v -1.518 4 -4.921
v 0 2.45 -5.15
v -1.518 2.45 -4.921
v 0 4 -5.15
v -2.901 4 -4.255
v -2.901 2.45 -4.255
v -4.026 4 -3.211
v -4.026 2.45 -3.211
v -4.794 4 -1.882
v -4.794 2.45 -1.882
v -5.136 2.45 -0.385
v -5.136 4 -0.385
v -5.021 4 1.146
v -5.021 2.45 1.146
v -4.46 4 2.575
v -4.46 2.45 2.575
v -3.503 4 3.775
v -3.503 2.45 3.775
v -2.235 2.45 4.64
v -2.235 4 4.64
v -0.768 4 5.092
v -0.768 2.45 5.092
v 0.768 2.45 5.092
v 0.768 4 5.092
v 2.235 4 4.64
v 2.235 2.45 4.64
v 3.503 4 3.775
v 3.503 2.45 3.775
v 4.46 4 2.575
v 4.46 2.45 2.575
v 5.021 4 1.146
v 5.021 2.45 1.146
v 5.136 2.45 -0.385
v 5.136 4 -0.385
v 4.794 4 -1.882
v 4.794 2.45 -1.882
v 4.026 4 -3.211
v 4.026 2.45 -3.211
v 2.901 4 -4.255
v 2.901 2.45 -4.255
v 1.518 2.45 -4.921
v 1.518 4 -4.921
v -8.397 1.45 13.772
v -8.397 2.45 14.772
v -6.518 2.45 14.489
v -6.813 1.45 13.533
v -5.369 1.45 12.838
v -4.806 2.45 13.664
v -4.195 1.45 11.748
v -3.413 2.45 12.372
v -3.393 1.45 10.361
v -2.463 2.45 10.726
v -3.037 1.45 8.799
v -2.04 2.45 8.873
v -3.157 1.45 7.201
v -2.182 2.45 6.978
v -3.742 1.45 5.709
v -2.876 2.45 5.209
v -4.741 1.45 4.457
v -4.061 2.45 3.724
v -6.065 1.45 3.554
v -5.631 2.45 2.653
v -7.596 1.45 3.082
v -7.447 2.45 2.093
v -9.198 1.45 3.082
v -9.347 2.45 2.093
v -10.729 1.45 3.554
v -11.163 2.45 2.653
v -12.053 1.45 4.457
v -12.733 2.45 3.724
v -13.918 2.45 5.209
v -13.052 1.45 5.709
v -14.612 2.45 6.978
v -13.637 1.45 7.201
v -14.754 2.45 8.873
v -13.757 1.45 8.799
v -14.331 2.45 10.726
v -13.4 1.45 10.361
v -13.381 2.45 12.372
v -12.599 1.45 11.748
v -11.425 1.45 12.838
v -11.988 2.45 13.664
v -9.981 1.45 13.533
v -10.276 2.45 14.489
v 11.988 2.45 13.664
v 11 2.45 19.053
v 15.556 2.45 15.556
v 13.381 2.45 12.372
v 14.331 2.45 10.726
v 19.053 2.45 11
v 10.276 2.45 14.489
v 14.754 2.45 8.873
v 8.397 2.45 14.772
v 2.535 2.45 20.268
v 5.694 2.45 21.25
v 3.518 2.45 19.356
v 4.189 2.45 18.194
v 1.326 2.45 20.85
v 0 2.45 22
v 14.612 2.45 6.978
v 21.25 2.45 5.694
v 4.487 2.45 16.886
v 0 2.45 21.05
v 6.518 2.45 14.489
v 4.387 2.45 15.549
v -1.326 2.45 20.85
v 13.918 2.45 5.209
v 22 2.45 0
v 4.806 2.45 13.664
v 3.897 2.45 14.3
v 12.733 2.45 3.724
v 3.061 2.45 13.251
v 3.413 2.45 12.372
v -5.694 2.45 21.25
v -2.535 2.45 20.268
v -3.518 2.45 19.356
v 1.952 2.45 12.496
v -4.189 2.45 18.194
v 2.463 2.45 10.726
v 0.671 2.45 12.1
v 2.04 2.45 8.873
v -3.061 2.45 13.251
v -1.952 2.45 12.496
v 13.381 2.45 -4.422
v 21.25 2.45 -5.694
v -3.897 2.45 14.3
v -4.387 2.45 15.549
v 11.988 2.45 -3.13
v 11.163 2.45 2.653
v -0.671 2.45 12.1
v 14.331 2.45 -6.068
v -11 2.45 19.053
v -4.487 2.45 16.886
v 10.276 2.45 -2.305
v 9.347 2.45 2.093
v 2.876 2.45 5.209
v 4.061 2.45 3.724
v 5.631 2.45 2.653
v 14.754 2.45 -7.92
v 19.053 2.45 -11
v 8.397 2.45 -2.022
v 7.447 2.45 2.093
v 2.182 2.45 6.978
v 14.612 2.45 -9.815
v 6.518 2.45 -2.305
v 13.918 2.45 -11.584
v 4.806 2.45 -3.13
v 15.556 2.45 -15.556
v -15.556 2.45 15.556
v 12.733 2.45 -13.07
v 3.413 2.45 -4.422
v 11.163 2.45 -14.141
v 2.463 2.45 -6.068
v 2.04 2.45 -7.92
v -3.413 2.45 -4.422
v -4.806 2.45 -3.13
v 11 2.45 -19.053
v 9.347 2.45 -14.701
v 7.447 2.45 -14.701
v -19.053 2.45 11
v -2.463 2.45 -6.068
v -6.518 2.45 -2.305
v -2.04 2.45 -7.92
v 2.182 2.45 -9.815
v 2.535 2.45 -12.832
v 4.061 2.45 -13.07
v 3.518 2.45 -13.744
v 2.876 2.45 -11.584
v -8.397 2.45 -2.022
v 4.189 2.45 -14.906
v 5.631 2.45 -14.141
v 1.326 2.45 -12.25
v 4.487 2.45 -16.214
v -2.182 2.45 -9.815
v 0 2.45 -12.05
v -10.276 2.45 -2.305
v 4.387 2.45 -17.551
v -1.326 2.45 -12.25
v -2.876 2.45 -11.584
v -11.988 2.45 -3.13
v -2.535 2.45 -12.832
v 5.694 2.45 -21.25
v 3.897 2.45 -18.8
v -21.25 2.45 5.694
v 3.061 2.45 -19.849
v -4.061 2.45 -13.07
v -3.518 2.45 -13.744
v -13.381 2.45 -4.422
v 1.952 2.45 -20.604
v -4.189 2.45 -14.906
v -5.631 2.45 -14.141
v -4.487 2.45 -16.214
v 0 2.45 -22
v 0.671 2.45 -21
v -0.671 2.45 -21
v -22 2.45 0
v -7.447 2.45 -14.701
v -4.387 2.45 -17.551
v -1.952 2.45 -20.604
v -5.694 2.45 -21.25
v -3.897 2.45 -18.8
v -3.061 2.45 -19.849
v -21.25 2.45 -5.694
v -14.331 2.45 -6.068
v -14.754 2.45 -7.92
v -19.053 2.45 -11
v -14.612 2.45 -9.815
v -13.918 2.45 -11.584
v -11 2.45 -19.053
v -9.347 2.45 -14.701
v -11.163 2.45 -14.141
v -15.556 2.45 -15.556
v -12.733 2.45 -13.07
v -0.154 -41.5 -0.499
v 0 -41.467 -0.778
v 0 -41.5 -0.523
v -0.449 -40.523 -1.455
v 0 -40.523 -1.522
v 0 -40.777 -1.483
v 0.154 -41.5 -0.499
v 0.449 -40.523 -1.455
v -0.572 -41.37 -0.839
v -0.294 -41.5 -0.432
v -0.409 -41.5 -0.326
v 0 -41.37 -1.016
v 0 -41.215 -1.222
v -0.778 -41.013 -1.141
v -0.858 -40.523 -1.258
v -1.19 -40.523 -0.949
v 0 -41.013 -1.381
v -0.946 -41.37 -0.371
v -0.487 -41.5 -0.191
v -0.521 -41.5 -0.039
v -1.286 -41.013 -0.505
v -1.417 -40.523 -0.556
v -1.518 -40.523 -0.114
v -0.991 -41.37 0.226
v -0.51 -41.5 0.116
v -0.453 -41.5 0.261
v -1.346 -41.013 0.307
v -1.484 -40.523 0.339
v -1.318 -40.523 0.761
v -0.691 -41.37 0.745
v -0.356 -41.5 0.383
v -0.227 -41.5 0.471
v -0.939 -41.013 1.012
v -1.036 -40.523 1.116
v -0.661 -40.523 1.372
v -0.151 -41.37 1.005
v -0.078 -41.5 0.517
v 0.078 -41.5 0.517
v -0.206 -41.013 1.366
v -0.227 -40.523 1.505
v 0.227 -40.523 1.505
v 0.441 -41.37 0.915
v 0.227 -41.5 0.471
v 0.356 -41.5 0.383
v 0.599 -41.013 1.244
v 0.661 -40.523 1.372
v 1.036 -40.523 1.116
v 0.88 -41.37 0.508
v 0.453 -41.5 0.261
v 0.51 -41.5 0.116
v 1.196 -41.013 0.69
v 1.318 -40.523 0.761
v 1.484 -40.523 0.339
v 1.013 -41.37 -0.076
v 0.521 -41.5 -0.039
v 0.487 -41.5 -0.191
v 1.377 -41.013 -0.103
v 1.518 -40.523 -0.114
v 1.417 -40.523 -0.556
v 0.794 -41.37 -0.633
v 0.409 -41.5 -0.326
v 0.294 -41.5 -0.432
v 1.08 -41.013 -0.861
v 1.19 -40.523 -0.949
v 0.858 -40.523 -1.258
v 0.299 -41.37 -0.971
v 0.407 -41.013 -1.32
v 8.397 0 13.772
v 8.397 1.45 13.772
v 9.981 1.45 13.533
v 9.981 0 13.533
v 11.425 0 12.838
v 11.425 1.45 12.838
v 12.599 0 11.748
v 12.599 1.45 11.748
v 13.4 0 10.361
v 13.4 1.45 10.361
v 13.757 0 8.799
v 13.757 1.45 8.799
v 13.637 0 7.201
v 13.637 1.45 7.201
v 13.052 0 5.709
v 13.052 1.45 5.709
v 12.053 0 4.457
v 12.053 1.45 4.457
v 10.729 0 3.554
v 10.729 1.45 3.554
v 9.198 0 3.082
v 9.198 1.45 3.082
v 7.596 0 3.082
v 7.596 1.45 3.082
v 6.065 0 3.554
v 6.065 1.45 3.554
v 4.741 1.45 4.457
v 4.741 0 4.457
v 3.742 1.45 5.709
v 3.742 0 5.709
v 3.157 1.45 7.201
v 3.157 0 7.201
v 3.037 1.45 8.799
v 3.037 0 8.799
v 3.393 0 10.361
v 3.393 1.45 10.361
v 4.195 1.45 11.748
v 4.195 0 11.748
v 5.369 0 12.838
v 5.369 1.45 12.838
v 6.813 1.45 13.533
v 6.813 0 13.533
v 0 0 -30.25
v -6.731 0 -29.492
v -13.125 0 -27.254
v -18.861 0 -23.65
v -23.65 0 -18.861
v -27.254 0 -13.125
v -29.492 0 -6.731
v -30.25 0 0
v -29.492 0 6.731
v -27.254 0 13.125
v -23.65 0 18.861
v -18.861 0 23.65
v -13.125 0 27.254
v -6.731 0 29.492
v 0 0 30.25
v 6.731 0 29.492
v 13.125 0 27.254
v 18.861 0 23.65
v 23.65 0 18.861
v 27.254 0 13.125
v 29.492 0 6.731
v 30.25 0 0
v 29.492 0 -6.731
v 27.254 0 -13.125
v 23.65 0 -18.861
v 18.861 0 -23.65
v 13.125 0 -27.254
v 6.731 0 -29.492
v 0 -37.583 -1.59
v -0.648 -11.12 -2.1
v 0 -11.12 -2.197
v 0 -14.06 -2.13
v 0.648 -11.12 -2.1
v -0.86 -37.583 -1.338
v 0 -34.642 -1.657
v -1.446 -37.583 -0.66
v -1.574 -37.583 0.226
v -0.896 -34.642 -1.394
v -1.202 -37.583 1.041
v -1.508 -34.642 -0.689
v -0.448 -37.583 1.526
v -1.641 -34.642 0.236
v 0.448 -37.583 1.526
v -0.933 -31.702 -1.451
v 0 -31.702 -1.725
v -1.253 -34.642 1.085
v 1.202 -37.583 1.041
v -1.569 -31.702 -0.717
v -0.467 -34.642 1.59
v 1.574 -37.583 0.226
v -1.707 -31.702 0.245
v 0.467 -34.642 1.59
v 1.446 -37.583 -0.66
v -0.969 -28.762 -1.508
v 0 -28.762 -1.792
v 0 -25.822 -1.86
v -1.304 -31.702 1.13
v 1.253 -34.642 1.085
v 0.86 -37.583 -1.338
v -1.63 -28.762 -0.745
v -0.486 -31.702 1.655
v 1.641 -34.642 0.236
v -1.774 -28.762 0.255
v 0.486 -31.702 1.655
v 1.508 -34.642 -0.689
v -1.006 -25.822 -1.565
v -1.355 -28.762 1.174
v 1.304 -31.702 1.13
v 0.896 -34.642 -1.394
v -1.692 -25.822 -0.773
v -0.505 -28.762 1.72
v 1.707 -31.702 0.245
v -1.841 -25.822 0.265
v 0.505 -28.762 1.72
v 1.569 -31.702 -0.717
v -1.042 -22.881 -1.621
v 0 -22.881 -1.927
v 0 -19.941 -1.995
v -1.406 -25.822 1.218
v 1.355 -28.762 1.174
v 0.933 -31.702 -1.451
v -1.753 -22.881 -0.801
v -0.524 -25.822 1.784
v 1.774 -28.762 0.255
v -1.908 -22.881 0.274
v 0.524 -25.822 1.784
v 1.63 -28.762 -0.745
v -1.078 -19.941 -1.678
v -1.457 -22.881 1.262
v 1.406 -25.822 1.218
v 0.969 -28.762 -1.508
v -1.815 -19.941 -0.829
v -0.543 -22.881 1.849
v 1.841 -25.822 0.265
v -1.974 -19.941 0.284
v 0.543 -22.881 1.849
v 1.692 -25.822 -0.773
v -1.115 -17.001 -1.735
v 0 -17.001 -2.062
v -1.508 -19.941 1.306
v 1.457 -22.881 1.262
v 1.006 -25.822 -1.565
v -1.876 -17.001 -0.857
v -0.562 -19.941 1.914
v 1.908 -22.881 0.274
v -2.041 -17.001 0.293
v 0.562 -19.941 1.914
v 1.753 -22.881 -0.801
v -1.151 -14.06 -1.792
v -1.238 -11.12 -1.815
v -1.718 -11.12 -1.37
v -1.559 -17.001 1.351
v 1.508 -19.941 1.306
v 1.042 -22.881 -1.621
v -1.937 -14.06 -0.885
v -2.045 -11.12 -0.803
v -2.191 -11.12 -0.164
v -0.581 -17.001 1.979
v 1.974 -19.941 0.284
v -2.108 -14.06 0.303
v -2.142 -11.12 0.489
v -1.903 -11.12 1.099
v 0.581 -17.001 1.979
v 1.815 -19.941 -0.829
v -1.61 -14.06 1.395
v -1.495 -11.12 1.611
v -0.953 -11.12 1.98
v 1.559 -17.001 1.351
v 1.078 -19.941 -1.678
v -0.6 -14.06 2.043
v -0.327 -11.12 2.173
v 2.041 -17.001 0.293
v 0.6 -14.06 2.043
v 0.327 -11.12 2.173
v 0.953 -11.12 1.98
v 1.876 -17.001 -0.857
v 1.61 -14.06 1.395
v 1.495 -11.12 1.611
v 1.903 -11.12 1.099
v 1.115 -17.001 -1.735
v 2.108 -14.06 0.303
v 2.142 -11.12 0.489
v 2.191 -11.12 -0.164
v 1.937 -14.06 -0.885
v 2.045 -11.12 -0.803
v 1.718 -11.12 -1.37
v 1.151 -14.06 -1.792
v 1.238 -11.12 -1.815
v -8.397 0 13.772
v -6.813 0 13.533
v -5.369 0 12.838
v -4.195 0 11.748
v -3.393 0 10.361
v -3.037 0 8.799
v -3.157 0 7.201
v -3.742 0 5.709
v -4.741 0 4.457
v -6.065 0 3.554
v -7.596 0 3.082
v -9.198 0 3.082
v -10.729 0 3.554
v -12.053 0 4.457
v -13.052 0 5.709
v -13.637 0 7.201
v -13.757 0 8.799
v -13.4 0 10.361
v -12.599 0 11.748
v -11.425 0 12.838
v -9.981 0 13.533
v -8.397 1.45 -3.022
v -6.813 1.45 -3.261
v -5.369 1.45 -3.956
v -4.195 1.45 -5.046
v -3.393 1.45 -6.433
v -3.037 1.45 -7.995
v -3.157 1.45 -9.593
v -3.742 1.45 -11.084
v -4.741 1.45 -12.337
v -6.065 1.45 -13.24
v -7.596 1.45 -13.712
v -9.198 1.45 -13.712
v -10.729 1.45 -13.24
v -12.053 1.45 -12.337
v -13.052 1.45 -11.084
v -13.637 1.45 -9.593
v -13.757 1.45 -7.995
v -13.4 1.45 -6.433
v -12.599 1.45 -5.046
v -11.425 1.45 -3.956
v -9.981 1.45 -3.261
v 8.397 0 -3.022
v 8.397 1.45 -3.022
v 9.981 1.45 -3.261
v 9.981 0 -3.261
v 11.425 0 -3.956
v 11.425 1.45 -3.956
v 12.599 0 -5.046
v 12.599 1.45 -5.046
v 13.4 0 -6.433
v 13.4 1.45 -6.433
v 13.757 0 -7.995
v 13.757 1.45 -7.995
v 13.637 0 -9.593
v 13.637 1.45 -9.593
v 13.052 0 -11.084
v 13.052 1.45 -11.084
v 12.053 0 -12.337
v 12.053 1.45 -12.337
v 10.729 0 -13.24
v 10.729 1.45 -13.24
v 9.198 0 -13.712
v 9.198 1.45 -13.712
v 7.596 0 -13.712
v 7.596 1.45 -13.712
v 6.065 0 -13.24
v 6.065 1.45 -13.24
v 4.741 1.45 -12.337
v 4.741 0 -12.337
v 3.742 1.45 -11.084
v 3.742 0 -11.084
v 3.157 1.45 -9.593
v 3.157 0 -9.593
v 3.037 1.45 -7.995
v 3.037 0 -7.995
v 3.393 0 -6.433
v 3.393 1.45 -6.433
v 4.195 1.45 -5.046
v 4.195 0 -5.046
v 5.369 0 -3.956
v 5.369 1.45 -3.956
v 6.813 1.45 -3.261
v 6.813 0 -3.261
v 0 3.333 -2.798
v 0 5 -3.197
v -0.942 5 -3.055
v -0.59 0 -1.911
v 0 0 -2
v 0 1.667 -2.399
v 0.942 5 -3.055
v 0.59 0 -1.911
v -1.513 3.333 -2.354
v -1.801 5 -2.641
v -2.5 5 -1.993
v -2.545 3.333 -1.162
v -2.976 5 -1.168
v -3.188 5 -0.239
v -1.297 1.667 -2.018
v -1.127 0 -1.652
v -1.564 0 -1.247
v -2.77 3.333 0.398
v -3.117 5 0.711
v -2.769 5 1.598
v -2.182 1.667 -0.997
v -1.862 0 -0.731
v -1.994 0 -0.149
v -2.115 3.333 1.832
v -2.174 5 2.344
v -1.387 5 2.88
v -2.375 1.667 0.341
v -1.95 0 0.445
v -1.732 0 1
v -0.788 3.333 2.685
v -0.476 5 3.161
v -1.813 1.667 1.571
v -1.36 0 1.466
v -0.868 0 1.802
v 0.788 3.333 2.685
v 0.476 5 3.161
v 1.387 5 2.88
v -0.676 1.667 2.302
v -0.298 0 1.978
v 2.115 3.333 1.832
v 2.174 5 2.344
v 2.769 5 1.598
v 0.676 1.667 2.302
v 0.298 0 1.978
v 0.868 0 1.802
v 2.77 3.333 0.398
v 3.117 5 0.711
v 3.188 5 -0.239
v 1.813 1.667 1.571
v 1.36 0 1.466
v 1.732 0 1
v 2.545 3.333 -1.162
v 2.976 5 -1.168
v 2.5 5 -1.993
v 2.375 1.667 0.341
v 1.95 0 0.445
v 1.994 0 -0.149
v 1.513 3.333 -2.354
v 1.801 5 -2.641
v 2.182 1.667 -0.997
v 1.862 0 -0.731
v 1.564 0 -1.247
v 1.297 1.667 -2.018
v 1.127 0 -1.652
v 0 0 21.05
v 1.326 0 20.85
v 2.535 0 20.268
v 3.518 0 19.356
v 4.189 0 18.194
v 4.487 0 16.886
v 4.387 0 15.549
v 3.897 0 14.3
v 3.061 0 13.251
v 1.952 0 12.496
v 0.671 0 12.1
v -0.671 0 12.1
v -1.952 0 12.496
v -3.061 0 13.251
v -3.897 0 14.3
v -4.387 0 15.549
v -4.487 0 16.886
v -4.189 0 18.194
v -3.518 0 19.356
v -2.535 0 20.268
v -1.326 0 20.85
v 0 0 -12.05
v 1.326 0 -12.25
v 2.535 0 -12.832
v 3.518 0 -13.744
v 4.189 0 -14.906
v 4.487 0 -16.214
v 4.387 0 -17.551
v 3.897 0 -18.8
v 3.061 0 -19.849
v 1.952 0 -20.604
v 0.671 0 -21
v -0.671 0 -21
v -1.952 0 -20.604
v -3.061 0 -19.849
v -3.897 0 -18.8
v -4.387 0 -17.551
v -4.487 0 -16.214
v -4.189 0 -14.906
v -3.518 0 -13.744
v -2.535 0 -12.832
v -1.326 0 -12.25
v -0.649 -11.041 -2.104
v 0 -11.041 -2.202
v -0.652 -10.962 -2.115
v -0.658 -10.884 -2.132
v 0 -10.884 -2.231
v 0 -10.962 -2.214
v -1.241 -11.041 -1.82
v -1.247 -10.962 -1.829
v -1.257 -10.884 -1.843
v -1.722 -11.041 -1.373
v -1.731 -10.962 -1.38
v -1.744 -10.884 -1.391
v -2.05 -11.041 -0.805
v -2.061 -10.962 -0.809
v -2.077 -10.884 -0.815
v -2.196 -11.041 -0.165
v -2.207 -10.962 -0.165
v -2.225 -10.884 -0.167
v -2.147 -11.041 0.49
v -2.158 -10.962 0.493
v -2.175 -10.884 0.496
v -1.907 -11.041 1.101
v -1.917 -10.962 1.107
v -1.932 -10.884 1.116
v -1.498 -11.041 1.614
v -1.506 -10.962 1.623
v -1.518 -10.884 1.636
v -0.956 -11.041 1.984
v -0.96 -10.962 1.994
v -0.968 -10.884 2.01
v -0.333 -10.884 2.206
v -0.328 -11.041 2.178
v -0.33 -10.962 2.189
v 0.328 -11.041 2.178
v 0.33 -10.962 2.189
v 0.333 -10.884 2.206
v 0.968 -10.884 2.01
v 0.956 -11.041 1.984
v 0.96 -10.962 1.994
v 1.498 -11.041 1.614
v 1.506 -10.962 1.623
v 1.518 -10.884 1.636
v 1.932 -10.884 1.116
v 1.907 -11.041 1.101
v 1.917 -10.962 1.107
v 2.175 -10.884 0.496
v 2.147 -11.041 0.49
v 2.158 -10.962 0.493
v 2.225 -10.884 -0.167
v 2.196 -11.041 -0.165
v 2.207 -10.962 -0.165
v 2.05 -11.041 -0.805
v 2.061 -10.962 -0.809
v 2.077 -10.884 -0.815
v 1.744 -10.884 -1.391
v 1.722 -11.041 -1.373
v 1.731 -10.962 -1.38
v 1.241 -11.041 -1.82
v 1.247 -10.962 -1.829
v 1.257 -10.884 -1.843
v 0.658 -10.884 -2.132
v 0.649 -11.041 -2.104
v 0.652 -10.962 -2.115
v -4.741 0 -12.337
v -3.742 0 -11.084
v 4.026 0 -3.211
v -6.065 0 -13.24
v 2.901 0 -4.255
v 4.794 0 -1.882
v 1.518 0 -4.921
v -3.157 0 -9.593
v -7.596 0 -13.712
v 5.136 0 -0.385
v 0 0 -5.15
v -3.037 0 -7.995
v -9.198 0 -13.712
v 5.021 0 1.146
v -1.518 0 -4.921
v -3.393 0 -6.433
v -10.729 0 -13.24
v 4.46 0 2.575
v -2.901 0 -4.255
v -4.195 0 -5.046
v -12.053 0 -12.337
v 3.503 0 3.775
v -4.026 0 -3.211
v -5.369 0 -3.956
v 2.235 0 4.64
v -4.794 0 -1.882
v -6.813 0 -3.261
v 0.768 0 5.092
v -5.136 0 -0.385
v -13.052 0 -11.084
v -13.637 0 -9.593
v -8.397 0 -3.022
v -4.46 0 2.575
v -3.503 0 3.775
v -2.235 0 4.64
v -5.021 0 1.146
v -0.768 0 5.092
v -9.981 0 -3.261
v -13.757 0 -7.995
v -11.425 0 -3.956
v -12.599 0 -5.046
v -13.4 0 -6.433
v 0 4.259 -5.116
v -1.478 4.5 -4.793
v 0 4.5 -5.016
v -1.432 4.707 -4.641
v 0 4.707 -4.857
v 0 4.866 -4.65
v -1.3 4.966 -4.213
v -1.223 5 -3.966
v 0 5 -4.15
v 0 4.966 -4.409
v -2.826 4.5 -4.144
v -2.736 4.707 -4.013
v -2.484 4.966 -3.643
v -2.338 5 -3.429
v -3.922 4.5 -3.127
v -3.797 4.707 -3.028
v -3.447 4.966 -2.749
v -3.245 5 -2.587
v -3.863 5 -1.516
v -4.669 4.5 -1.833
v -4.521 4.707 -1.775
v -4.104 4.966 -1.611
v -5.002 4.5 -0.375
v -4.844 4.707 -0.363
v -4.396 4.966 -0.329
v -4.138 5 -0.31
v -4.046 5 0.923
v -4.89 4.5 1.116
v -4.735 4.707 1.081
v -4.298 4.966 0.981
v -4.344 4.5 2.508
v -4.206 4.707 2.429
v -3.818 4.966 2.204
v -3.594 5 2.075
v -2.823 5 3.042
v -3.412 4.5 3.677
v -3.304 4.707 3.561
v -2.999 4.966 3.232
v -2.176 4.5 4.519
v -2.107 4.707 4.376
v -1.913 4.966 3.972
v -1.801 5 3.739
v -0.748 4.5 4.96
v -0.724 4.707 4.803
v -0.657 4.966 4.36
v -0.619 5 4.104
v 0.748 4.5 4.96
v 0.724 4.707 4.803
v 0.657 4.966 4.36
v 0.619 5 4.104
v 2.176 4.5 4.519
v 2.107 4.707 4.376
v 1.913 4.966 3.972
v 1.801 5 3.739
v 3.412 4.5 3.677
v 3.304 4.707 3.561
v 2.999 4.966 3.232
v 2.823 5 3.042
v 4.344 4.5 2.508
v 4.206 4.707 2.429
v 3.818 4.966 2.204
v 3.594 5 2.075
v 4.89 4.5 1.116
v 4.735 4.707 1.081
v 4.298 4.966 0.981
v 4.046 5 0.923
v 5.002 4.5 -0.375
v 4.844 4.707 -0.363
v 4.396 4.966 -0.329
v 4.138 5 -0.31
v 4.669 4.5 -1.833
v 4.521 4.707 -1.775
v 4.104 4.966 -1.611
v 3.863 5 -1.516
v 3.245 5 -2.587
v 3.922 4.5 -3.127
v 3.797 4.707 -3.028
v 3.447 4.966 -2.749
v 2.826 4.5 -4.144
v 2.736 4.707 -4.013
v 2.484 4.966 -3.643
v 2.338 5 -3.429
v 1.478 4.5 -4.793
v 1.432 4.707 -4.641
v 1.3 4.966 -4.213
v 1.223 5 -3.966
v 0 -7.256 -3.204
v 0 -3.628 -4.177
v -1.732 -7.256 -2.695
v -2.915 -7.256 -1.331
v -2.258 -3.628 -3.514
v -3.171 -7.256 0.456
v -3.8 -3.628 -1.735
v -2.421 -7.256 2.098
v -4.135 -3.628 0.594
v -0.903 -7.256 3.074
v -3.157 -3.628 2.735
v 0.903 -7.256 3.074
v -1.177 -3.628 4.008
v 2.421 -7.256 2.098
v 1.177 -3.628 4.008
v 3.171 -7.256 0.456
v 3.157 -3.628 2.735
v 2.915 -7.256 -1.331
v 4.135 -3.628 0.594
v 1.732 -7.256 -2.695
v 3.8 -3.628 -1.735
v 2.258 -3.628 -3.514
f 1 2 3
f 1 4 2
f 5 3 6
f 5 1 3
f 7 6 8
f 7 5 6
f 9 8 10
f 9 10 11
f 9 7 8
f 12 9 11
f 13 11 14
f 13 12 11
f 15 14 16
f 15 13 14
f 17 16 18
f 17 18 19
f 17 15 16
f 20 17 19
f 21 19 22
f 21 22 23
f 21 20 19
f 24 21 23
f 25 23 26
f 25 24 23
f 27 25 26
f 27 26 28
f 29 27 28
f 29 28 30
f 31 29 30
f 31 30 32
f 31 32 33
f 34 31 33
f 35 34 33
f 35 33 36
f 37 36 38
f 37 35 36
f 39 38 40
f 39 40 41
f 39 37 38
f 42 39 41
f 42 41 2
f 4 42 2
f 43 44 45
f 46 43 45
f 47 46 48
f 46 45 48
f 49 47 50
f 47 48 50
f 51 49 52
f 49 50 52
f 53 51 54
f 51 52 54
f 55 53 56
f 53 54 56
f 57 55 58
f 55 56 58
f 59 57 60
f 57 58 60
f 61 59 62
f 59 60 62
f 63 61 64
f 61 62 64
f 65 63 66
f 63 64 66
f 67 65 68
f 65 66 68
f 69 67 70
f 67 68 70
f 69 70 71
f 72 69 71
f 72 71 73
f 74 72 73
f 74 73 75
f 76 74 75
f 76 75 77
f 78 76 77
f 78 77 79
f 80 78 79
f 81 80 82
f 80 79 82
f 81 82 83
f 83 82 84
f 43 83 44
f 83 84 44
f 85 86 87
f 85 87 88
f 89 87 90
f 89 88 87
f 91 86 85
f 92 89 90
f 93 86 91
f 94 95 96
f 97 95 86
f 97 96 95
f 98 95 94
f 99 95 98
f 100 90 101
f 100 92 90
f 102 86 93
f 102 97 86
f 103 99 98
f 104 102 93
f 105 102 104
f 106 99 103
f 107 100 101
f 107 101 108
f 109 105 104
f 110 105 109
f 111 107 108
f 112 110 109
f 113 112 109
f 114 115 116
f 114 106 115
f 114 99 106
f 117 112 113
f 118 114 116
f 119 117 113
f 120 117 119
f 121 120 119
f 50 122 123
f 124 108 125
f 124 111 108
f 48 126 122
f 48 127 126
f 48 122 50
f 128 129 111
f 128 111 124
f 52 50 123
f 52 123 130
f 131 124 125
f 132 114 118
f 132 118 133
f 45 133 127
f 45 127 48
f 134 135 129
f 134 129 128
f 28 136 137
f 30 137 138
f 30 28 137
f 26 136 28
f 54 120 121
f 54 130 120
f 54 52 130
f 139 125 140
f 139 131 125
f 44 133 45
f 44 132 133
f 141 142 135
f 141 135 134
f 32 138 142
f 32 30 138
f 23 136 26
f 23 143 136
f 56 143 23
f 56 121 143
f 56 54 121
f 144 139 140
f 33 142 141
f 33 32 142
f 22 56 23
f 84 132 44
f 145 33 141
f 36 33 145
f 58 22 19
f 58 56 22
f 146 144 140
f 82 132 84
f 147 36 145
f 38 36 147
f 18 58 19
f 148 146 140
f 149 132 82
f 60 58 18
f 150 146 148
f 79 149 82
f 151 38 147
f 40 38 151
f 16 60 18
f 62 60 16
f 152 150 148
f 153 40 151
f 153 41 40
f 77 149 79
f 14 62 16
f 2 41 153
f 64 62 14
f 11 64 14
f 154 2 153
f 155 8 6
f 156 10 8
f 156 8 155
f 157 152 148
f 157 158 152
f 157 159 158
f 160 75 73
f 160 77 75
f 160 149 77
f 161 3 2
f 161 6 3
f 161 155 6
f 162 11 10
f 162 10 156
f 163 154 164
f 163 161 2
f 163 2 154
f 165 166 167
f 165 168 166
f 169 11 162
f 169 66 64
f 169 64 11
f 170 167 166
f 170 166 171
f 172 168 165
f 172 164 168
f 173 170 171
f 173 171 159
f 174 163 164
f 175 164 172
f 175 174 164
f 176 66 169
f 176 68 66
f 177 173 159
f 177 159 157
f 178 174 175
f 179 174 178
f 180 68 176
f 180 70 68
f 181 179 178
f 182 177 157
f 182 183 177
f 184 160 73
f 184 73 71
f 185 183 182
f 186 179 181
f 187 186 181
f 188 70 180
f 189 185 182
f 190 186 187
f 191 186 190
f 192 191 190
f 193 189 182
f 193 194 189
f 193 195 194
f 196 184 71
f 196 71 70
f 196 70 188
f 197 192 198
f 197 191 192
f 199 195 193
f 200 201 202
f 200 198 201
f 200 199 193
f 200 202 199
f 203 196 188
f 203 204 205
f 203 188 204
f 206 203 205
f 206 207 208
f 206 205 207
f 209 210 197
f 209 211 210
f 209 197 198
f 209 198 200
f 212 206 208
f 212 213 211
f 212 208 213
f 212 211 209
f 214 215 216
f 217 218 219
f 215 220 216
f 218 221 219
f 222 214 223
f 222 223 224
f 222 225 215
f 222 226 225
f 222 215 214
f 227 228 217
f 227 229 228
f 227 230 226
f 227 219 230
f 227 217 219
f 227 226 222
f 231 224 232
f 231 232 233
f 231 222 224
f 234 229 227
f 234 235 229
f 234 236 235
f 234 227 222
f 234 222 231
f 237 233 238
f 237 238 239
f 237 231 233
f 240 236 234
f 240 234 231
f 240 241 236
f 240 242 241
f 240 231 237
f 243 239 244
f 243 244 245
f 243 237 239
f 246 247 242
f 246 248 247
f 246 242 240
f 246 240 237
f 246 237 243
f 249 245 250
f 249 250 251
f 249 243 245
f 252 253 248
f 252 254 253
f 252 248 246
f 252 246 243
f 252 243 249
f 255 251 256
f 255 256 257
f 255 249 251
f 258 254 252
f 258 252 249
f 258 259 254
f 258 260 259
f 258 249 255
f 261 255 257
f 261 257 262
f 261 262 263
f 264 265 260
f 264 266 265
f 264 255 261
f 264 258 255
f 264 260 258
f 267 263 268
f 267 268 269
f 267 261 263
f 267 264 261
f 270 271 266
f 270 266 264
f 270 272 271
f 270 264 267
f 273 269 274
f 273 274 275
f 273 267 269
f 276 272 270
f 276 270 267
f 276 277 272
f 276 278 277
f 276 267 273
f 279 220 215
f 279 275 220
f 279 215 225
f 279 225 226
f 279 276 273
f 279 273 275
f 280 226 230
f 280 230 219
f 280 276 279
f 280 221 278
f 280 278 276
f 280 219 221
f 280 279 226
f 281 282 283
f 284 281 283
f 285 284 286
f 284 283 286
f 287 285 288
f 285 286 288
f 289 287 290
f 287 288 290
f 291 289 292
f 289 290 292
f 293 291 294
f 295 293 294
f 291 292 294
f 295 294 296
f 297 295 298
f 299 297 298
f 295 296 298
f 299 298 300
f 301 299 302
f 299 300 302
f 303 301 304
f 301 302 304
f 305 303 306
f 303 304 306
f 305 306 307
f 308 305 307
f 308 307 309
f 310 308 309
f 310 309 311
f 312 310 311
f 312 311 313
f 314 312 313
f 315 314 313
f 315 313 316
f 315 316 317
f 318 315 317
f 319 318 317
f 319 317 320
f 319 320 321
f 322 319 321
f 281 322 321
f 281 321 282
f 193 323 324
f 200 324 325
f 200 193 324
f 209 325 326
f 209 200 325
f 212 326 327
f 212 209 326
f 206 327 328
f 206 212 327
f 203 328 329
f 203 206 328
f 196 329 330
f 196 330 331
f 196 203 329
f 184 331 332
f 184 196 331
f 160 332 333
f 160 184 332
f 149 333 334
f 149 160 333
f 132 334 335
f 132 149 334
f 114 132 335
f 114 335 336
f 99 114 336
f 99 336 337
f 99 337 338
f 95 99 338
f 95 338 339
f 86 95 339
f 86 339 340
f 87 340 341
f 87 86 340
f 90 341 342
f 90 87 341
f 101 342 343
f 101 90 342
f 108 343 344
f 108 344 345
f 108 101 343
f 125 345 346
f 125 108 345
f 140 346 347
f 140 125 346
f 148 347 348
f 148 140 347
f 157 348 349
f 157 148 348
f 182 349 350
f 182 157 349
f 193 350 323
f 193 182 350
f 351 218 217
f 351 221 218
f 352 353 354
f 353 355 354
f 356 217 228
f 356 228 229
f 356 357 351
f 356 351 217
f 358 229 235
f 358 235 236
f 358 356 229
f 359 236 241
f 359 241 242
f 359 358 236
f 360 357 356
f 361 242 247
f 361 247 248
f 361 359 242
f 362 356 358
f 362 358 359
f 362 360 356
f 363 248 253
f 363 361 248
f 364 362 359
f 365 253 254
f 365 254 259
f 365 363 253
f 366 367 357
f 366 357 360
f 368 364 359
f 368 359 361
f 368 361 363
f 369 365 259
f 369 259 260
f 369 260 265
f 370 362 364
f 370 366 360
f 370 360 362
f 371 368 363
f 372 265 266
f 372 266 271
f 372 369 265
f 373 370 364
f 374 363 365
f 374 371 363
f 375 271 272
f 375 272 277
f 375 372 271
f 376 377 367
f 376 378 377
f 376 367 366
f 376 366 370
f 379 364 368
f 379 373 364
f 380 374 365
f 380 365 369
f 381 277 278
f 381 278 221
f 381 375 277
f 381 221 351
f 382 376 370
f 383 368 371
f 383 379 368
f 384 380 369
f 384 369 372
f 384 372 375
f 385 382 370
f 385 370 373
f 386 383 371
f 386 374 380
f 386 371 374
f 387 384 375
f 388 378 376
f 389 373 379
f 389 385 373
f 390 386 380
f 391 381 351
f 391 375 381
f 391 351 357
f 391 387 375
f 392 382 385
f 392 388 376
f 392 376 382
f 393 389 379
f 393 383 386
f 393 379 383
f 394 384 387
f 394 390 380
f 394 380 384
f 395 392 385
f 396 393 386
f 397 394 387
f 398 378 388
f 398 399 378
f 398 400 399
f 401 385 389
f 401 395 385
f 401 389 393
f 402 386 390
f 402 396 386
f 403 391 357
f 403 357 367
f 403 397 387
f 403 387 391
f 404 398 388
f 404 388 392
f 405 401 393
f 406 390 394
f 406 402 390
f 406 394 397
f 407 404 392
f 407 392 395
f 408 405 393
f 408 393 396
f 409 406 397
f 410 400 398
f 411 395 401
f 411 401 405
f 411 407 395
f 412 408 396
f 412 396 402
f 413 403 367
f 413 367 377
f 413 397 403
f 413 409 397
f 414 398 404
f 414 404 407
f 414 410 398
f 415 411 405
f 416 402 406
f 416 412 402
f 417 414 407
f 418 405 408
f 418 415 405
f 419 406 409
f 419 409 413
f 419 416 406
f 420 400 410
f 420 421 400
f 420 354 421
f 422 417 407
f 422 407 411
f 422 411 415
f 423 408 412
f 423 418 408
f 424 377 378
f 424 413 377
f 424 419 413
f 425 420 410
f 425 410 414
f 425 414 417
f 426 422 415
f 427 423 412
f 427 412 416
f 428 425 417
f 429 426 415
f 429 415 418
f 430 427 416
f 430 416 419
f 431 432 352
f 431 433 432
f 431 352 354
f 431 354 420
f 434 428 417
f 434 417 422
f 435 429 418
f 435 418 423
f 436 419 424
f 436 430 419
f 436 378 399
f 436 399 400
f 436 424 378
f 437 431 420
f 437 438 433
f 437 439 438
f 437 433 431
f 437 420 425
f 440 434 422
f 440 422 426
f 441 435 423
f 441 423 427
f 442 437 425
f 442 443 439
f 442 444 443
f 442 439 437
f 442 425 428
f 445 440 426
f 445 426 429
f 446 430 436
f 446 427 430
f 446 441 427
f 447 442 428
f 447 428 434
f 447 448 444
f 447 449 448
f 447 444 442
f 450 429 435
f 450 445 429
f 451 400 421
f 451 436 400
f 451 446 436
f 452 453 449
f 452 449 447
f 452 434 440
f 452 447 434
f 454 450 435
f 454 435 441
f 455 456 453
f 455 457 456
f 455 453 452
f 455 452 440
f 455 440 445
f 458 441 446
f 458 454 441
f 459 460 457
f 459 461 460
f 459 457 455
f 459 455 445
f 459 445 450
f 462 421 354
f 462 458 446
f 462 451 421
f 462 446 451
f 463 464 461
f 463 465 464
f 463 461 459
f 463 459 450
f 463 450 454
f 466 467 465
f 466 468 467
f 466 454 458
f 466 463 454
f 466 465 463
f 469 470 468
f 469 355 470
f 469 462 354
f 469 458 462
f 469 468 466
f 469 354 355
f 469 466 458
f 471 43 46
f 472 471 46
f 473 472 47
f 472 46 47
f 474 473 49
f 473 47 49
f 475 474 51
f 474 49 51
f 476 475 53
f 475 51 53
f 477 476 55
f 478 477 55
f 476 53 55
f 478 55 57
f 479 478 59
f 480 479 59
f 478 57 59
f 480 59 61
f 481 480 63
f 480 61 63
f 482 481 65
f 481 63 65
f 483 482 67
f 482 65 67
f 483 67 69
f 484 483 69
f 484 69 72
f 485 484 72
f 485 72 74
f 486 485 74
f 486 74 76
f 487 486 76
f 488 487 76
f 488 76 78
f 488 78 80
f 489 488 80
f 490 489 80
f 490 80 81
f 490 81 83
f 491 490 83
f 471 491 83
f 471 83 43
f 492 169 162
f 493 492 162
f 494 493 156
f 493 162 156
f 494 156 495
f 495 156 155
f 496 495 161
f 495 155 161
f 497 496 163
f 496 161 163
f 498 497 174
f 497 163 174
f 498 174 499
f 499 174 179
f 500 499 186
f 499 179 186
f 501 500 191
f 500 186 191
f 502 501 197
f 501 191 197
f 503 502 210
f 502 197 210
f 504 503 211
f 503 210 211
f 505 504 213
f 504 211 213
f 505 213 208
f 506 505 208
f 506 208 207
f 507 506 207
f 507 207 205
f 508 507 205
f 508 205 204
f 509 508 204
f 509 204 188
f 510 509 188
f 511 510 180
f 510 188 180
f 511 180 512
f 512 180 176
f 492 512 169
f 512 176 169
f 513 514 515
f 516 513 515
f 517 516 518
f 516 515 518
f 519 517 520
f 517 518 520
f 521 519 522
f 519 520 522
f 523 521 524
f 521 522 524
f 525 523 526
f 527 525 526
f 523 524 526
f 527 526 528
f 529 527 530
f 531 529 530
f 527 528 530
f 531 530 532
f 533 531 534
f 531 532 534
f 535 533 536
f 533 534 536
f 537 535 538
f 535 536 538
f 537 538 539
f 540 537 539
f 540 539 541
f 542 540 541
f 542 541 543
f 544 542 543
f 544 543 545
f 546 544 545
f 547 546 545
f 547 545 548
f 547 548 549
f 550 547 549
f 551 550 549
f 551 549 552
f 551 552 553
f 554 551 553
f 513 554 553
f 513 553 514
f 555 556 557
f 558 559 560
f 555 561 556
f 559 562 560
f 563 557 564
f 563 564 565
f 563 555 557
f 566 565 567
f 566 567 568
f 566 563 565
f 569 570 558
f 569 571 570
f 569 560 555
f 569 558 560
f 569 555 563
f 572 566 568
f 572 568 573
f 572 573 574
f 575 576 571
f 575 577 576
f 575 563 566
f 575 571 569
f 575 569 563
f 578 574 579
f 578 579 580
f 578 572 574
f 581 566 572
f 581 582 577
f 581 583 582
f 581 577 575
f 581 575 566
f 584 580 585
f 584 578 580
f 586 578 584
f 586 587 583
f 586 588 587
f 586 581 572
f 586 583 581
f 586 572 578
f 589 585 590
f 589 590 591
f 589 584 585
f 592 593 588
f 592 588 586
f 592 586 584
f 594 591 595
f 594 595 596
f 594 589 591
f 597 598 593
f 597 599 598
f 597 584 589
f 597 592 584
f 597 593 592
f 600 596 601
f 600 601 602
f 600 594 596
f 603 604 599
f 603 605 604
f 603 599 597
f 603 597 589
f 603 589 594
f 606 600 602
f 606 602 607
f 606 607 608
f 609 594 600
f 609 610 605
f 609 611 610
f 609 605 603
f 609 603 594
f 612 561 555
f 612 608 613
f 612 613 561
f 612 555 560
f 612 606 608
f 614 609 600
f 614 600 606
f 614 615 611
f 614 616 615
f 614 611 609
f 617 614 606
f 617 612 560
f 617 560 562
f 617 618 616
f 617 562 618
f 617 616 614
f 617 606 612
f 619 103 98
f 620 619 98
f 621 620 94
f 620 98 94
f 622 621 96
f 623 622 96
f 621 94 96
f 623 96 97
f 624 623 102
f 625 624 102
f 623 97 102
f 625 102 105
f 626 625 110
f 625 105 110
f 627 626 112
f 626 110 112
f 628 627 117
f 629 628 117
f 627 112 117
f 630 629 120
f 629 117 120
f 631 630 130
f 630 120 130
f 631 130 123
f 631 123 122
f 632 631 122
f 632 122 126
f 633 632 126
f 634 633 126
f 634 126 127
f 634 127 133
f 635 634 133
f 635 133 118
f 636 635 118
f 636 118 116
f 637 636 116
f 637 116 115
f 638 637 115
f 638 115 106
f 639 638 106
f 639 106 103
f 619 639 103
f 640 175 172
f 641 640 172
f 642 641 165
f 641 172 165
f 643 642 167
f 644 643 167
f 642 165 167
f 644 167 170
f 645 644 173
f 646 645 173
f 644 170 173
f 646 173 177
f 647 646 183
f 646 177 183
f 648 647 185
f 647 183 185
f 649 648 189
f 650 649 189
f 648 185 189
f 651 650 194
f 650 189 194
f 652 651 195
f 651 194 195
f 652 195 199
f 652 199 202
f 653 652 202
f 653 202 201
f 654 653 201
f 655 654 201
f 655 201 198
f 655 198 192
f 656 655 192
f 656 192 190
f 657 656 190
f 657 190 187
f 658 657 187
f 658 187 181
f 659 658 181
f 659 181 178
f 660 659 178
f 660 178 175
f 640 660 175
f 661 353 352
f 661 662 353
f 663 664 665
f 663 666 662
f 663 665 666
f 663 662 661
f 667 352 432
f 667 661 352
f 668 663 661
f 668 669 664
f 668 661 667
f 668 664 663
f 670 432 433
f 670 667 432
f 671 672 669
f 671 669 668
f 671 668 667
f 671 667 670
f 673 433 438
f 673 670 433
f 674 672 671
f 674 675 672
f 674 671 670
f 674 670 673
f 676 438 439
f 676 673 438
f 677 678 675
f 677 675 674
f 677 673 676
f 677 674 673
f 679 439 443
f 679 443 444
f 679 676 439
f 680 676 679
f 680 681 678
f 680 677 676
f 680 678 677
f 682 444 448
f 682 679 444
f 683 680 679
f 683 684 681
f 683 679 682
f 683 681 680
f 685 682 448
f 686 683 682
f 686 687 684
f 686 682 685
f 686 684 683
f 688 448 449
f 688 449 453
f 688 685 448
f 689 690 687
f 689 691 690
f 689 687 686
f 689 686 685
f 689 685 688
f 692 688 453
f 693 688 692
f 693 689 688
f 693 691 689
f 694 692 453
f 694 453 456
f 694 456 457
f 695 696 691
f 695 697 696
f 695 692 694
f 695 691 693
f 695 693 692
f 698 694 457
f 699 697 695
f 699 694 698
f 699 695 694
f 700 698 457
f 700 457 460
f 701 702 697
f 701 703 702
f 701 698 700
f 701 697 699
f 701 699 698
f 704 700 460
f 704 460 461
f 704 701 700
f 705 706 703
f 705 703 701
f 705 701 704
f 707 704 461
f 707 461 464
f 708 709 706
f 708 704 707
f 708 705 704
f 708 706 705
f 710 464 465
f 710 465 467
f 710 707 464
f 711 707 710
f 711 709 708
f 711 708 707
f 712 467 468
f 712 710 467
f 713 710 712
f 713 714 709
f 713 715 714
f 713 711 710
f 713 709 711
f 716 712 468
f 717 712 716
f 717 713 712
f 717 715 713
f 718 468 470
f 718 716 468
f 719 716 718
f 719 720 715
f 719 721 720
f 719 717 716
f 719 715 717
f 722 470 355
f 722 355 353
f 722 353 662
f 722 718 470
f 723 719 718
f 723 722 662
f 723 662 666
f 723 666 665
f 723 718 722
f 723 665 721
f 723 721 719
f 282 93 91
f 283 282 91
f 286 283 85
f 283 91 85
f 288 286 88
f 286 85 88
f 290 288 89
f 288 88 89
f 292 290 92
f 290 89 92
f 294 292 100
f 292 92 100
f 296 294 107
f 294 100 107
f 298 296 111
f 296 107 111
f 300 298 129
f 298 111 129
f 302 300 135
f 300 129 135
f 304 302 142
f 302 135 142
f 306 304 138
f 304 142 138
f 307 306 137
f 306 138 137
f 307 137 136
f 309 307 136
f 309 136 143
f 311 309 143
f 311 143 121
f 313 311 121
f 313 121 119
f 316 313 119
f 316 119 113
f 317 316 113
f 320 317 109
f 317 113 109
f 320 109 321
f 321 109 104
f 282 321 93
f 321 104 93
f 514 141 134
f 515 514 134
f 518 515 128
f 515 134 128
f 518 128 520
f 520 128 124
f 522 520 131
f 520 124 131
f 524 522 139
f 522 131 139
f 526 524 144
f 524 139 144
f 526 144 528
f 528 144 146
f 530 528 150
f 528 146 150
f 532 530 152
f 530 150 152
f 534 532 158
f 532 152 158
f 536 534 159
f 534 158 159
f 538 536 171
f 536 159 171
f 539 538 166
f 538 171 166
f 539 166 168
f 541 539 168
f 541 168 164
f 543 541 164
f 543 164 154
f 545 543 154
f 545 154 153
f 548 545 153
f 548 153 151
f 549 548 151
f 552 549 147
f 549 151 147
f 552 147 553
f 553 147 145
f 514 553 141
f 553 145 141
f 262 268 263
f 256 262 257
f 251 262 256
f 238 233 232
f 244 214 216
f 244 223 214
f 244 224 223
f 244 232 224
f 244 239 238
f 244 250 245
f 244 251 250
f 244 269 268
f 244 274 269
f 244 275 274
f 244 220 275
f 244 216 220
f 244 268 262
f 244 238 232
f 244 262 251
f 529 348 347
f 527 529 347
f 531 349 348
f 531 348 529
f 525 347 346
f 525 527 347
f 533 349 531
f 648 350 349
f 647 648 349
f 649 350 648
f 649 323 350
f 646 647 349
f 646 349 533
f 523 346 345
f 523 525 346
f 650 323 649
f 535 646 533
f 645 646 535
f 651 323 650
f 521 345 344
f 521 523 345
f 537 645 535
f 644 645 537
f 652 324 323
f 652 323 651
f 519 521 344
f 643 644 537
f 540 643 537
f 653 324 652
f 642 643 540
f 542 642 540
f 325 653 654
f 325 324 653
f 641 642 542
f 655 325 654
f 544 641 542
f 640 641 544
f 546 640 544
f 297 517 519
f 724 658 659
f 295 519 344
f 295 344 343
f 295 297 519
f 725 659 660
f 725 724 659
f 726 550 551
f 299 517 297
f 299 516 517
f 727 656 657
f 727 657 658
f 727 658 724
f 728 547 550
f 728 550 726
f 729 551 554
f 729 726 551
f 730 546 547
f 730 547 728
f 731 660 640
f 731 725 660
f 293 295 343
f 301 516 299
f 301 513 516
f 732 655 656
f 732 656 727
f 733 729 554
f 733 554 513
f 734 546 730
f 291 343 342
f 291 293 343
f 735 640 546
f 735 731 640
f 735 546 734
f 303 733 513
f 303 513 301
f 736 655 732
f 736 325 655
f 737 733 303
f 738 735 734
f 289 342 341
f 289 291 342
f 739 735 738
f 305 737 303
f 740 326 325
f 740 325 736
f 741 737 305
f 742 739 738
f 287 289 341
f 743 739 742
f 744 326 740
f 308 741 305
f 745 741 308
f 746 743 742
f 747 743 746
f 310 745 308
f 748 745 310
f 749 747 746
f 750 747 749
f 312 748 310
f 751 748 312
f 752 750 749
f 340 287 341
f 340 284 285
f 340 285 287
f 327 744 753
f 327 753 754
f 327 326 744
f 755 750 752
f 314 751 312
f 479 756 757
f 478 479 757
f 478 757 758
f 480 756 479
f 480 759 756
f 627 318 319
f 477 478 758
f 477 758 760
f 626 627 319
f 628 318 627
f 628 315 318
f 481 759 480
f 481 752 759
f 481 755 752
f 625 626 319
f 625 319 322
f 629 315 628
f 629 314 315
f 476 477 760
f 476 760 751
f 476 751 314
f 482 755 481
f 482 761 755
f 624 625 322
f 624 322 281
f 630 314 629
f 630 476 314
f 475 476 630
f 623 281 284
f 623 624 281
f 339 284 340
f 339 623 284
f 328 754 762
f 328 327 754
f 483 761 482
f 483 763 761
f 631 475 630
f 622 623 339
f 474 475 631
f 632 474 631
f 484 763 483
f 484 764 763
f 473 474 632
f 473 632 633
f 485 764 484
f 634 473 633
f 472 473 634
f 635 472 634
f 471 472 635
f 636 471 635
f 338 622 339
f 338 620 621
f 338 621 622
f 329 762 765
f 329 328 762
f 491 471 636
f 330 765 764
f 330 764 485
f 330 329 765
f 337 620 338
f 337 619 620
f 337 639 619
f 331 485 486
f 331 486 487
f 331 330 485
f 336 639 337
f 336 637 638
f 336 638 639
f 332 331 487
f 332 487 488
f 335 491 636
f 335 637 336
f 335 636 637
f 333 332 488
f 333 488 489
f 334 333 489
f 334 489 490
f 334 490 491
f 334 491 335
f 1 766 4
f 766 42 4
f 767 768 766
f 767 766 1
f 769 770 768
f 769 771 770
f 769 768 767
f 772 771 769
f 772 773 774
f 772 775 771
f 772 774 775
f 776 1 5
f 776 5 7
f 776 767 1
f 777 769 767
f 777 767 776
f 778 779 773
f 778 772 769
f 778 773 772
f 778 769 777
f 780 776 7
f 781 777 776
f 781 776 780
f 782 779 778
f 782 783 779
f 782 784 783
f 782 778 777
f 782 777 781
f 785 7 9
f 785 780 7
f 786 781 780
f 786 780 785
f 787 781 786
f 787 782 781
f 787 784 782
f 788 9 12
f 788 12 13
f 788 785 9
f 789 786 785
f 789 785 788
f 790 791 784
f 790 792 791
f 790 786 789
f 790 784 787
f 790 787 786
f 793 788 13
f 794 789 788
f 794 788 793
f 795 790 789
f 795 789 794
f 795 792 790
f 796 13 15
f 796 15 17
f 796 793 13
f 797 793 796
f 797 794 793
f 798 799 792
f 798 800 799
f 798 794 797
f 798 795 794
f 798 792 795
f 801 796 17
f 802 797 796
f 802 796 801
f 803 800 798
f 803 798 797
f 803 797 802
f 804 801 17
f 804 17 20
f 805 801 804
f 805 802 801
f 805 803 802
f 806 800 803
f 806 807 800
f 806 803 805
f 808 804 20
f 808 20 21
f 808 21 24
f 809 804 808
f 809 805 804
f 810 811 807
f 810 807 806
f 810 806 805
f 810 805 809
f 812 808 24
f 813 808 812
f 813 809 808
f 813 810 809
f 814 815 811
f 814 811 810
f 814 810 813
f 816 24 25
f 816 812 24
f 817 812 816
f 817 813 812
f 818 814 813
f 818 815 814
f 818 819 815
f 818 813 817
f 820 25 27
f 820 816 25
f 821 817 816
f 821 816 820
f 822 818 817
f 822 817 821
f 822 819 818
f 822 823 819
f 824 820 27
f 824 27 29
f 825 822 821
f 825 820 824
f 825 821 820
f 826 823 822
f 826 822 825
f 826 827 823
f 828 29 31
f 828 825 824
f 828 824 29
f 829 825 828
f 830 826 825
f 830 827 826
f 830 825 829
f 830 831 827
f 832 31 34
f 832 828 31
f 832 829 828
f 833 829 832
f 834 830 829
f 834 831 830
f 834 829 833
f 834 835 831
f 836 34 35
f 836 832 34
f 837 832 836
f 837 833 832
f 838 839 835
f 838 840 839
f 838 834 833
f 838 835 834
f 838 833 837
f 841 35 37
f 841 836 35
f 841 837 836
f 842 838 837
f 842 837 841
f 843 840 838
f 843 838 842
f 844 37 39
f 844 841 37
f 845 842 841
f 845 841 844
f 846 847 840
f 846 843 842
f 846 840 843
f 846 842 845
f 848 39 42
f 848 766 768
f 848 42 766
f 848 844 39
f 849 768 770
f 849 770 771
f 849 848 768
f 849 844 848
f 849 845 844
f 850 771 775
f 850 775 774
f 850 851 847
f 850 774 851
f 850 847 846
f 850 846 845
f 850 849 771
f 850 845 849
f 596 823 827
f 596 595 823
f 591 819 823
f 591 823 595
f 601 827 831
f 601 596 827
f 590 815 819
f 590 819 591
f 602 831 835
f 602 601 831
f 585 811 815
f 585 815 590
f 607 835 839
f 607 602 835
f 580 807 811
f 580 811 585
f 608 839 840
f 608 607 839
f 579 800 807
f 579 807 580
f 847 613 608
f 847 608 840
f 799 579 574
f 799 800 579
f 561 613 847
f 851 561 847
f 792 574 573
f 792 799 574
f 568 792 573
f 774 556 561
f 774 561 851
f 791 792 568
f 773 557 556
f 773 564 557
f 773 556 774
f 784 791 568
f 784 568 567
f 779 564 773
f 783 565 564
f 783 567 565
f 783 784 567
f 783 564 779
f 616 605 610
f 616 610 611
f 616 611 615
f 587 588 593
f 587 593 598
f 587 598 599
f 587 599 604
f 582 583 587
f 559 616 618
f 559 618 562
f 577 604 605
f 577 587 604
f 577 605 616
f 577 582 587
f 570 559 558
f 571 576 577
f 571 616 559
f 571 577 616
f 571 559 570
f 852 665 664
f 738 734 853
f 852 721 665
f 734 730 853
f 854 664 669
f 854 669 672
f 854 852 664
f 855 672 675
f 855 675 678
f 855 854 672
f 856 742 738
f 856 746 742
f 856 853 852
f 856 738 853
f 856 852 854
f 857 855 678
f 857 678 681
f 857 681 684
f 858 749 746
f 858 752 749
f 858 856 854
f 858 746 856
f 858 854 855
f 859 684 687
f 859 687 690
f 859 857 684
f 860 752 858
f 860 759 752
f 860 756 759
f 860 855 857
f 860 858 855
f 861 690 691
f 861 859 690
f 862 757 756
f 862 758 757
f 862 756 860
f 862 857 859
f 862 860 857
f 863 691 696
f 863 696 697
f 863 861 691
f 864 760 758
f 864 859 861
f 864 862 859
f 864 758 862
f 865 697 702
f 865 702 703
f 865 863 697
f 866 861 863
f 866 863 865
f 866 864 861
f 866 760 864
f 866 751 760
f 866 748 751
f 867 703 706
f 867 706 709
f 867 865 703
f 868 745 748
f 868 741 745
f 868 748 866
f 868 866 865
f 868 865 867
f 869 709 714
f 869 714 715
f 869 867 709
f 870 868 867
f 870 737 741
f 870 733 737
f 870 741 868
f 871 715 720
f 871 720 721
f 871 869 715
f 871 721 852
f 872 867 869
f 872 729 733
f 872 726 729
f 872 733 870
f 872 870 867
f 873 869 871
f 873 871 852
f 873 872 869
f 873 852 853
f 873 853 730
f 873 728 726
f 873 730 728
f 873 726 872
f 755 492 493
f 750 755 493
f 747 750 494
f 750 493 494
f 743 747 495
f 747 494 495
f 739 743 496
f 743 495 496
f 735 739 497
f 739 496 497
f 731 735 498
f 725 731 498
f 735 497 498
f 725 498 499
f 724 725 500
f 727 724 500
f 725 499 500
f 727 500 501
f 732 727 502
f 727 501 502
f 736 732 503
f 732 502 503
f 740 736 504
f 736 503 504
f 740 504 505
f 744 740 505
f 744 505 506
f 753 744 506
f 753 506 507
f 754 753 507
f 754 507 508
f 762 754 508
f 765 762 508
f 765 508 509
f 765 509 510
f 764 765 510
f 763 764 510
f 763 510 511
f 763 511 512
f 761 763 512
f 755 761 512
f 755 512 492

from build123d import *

# Parameters (mm, degrees)
ESQUISSE2_R             = 4.5
ESQUISSE2_R_2           = 5.375
ENL_V_MAT_EXTRU_1_DEPTH = 62.33292353
CHANFREIN2_SIZE         = 1


with BuildPart() as part:
    # Esquisse1 → Révolution1 (revolve)
    with BuildSketch(Plane.XY, mode=Mode.PRIVATE) as r_volution1_sk:
        with BuildLine():
            Line((-5.15, 0), (-30.25, 0))
            Line((-30.25, 0), (-22, 2.45))
            Line((-22, 2.45), (-5.15, 2.45))
            Line((-5.15, 2.45), (-5.15, 4))
            ThreePointArc((-5.15, 4), (-4.857106781, 4.707106781), (-4.15, 5))
            Line((-4.15, 5), (-3.196980896, 5))
            Line((-3.196980896, 5), (-2, 0))
            Line((-2, 0), (0, 0))
            Line((0, 0), (0, -41.5))
            Line((0, -41.5), (-0.522687484, -41.5))
            ThreePointArc((-0.522687484, -41.5), (-1.221634987, -41.215172978), (-1.522424218, -40.522944778))
            Line((-1.522424218, -40.522944778), (-2.197244162, -11.120075793))
            ThreePointArc((-2.197244162, -11.120075793), (-2.207114239, -11.001020564), (-2.231111264, -10.883991897))
            Line((-2.231111264, -10.883991897), (-5.15, 0))
        make_face()
    revolve(r_volution1_sk.sketch.rotate(Axis((0, 0, 0), (0, 1, 0)), 270), axis=Axis((0, 0, 0), (0, 1, 0)))

    # Esquisse2 → Enlèv. mat.-Extru.1 (cut, through all)
    with BuildSketch(Plane(origin=(0, 2.45, 0), x_dir=(1, 0, 0), z_dir=(0, 1, 0))):
        with Locations(Location((0, 16.55, 0), (0, 0, 270))):
            Circle(ESQUISSE2_R)
        with Locations(Location((-8.396893027, 8.396893027, 0), (0, 0, 270))):
            Circle(ESQUISSE2_R_2)
        with Locations(Location((8.396893027, 8.396893027, 0), (0, 0, 270))):
            Circle(ESQUISSE2_R_2)
        with Locations(Location((8.396893027, -8.396893027, 0), (0, 0, 270))):
            Circle(ESQUISSE2_R_2)
        with Locations(Location((0, -16.55, 0), (0, 0, 270))):
            Circle(ESQUISSE2_R)
        with Locations(Location((-8.396893027, -8.396893027, 0), (0, 0, 270))):
            Circle(ESQUISSE2_R_2)
    extrude(amount=-ENL_V_MAT_EXTRU_1_DEPTH, mode=Mode.SUBTRACT)

    # Chanfrein2
    chanfrein2_edges = [part.edges().sort_by_distance(p)[0] for p in [
        (-8.396893027, 2.45, -13.771893027),
        (8.396893027, 2.45, 3.021893027),
        (8.396893027, 2.45, -13.771893027),
        (-8.396893027, 2.45, 3.021893027),
    ]]
    chamfer(chanfrein2_edges, length=CHANFREIN2_SIZE)


solid = part.part
